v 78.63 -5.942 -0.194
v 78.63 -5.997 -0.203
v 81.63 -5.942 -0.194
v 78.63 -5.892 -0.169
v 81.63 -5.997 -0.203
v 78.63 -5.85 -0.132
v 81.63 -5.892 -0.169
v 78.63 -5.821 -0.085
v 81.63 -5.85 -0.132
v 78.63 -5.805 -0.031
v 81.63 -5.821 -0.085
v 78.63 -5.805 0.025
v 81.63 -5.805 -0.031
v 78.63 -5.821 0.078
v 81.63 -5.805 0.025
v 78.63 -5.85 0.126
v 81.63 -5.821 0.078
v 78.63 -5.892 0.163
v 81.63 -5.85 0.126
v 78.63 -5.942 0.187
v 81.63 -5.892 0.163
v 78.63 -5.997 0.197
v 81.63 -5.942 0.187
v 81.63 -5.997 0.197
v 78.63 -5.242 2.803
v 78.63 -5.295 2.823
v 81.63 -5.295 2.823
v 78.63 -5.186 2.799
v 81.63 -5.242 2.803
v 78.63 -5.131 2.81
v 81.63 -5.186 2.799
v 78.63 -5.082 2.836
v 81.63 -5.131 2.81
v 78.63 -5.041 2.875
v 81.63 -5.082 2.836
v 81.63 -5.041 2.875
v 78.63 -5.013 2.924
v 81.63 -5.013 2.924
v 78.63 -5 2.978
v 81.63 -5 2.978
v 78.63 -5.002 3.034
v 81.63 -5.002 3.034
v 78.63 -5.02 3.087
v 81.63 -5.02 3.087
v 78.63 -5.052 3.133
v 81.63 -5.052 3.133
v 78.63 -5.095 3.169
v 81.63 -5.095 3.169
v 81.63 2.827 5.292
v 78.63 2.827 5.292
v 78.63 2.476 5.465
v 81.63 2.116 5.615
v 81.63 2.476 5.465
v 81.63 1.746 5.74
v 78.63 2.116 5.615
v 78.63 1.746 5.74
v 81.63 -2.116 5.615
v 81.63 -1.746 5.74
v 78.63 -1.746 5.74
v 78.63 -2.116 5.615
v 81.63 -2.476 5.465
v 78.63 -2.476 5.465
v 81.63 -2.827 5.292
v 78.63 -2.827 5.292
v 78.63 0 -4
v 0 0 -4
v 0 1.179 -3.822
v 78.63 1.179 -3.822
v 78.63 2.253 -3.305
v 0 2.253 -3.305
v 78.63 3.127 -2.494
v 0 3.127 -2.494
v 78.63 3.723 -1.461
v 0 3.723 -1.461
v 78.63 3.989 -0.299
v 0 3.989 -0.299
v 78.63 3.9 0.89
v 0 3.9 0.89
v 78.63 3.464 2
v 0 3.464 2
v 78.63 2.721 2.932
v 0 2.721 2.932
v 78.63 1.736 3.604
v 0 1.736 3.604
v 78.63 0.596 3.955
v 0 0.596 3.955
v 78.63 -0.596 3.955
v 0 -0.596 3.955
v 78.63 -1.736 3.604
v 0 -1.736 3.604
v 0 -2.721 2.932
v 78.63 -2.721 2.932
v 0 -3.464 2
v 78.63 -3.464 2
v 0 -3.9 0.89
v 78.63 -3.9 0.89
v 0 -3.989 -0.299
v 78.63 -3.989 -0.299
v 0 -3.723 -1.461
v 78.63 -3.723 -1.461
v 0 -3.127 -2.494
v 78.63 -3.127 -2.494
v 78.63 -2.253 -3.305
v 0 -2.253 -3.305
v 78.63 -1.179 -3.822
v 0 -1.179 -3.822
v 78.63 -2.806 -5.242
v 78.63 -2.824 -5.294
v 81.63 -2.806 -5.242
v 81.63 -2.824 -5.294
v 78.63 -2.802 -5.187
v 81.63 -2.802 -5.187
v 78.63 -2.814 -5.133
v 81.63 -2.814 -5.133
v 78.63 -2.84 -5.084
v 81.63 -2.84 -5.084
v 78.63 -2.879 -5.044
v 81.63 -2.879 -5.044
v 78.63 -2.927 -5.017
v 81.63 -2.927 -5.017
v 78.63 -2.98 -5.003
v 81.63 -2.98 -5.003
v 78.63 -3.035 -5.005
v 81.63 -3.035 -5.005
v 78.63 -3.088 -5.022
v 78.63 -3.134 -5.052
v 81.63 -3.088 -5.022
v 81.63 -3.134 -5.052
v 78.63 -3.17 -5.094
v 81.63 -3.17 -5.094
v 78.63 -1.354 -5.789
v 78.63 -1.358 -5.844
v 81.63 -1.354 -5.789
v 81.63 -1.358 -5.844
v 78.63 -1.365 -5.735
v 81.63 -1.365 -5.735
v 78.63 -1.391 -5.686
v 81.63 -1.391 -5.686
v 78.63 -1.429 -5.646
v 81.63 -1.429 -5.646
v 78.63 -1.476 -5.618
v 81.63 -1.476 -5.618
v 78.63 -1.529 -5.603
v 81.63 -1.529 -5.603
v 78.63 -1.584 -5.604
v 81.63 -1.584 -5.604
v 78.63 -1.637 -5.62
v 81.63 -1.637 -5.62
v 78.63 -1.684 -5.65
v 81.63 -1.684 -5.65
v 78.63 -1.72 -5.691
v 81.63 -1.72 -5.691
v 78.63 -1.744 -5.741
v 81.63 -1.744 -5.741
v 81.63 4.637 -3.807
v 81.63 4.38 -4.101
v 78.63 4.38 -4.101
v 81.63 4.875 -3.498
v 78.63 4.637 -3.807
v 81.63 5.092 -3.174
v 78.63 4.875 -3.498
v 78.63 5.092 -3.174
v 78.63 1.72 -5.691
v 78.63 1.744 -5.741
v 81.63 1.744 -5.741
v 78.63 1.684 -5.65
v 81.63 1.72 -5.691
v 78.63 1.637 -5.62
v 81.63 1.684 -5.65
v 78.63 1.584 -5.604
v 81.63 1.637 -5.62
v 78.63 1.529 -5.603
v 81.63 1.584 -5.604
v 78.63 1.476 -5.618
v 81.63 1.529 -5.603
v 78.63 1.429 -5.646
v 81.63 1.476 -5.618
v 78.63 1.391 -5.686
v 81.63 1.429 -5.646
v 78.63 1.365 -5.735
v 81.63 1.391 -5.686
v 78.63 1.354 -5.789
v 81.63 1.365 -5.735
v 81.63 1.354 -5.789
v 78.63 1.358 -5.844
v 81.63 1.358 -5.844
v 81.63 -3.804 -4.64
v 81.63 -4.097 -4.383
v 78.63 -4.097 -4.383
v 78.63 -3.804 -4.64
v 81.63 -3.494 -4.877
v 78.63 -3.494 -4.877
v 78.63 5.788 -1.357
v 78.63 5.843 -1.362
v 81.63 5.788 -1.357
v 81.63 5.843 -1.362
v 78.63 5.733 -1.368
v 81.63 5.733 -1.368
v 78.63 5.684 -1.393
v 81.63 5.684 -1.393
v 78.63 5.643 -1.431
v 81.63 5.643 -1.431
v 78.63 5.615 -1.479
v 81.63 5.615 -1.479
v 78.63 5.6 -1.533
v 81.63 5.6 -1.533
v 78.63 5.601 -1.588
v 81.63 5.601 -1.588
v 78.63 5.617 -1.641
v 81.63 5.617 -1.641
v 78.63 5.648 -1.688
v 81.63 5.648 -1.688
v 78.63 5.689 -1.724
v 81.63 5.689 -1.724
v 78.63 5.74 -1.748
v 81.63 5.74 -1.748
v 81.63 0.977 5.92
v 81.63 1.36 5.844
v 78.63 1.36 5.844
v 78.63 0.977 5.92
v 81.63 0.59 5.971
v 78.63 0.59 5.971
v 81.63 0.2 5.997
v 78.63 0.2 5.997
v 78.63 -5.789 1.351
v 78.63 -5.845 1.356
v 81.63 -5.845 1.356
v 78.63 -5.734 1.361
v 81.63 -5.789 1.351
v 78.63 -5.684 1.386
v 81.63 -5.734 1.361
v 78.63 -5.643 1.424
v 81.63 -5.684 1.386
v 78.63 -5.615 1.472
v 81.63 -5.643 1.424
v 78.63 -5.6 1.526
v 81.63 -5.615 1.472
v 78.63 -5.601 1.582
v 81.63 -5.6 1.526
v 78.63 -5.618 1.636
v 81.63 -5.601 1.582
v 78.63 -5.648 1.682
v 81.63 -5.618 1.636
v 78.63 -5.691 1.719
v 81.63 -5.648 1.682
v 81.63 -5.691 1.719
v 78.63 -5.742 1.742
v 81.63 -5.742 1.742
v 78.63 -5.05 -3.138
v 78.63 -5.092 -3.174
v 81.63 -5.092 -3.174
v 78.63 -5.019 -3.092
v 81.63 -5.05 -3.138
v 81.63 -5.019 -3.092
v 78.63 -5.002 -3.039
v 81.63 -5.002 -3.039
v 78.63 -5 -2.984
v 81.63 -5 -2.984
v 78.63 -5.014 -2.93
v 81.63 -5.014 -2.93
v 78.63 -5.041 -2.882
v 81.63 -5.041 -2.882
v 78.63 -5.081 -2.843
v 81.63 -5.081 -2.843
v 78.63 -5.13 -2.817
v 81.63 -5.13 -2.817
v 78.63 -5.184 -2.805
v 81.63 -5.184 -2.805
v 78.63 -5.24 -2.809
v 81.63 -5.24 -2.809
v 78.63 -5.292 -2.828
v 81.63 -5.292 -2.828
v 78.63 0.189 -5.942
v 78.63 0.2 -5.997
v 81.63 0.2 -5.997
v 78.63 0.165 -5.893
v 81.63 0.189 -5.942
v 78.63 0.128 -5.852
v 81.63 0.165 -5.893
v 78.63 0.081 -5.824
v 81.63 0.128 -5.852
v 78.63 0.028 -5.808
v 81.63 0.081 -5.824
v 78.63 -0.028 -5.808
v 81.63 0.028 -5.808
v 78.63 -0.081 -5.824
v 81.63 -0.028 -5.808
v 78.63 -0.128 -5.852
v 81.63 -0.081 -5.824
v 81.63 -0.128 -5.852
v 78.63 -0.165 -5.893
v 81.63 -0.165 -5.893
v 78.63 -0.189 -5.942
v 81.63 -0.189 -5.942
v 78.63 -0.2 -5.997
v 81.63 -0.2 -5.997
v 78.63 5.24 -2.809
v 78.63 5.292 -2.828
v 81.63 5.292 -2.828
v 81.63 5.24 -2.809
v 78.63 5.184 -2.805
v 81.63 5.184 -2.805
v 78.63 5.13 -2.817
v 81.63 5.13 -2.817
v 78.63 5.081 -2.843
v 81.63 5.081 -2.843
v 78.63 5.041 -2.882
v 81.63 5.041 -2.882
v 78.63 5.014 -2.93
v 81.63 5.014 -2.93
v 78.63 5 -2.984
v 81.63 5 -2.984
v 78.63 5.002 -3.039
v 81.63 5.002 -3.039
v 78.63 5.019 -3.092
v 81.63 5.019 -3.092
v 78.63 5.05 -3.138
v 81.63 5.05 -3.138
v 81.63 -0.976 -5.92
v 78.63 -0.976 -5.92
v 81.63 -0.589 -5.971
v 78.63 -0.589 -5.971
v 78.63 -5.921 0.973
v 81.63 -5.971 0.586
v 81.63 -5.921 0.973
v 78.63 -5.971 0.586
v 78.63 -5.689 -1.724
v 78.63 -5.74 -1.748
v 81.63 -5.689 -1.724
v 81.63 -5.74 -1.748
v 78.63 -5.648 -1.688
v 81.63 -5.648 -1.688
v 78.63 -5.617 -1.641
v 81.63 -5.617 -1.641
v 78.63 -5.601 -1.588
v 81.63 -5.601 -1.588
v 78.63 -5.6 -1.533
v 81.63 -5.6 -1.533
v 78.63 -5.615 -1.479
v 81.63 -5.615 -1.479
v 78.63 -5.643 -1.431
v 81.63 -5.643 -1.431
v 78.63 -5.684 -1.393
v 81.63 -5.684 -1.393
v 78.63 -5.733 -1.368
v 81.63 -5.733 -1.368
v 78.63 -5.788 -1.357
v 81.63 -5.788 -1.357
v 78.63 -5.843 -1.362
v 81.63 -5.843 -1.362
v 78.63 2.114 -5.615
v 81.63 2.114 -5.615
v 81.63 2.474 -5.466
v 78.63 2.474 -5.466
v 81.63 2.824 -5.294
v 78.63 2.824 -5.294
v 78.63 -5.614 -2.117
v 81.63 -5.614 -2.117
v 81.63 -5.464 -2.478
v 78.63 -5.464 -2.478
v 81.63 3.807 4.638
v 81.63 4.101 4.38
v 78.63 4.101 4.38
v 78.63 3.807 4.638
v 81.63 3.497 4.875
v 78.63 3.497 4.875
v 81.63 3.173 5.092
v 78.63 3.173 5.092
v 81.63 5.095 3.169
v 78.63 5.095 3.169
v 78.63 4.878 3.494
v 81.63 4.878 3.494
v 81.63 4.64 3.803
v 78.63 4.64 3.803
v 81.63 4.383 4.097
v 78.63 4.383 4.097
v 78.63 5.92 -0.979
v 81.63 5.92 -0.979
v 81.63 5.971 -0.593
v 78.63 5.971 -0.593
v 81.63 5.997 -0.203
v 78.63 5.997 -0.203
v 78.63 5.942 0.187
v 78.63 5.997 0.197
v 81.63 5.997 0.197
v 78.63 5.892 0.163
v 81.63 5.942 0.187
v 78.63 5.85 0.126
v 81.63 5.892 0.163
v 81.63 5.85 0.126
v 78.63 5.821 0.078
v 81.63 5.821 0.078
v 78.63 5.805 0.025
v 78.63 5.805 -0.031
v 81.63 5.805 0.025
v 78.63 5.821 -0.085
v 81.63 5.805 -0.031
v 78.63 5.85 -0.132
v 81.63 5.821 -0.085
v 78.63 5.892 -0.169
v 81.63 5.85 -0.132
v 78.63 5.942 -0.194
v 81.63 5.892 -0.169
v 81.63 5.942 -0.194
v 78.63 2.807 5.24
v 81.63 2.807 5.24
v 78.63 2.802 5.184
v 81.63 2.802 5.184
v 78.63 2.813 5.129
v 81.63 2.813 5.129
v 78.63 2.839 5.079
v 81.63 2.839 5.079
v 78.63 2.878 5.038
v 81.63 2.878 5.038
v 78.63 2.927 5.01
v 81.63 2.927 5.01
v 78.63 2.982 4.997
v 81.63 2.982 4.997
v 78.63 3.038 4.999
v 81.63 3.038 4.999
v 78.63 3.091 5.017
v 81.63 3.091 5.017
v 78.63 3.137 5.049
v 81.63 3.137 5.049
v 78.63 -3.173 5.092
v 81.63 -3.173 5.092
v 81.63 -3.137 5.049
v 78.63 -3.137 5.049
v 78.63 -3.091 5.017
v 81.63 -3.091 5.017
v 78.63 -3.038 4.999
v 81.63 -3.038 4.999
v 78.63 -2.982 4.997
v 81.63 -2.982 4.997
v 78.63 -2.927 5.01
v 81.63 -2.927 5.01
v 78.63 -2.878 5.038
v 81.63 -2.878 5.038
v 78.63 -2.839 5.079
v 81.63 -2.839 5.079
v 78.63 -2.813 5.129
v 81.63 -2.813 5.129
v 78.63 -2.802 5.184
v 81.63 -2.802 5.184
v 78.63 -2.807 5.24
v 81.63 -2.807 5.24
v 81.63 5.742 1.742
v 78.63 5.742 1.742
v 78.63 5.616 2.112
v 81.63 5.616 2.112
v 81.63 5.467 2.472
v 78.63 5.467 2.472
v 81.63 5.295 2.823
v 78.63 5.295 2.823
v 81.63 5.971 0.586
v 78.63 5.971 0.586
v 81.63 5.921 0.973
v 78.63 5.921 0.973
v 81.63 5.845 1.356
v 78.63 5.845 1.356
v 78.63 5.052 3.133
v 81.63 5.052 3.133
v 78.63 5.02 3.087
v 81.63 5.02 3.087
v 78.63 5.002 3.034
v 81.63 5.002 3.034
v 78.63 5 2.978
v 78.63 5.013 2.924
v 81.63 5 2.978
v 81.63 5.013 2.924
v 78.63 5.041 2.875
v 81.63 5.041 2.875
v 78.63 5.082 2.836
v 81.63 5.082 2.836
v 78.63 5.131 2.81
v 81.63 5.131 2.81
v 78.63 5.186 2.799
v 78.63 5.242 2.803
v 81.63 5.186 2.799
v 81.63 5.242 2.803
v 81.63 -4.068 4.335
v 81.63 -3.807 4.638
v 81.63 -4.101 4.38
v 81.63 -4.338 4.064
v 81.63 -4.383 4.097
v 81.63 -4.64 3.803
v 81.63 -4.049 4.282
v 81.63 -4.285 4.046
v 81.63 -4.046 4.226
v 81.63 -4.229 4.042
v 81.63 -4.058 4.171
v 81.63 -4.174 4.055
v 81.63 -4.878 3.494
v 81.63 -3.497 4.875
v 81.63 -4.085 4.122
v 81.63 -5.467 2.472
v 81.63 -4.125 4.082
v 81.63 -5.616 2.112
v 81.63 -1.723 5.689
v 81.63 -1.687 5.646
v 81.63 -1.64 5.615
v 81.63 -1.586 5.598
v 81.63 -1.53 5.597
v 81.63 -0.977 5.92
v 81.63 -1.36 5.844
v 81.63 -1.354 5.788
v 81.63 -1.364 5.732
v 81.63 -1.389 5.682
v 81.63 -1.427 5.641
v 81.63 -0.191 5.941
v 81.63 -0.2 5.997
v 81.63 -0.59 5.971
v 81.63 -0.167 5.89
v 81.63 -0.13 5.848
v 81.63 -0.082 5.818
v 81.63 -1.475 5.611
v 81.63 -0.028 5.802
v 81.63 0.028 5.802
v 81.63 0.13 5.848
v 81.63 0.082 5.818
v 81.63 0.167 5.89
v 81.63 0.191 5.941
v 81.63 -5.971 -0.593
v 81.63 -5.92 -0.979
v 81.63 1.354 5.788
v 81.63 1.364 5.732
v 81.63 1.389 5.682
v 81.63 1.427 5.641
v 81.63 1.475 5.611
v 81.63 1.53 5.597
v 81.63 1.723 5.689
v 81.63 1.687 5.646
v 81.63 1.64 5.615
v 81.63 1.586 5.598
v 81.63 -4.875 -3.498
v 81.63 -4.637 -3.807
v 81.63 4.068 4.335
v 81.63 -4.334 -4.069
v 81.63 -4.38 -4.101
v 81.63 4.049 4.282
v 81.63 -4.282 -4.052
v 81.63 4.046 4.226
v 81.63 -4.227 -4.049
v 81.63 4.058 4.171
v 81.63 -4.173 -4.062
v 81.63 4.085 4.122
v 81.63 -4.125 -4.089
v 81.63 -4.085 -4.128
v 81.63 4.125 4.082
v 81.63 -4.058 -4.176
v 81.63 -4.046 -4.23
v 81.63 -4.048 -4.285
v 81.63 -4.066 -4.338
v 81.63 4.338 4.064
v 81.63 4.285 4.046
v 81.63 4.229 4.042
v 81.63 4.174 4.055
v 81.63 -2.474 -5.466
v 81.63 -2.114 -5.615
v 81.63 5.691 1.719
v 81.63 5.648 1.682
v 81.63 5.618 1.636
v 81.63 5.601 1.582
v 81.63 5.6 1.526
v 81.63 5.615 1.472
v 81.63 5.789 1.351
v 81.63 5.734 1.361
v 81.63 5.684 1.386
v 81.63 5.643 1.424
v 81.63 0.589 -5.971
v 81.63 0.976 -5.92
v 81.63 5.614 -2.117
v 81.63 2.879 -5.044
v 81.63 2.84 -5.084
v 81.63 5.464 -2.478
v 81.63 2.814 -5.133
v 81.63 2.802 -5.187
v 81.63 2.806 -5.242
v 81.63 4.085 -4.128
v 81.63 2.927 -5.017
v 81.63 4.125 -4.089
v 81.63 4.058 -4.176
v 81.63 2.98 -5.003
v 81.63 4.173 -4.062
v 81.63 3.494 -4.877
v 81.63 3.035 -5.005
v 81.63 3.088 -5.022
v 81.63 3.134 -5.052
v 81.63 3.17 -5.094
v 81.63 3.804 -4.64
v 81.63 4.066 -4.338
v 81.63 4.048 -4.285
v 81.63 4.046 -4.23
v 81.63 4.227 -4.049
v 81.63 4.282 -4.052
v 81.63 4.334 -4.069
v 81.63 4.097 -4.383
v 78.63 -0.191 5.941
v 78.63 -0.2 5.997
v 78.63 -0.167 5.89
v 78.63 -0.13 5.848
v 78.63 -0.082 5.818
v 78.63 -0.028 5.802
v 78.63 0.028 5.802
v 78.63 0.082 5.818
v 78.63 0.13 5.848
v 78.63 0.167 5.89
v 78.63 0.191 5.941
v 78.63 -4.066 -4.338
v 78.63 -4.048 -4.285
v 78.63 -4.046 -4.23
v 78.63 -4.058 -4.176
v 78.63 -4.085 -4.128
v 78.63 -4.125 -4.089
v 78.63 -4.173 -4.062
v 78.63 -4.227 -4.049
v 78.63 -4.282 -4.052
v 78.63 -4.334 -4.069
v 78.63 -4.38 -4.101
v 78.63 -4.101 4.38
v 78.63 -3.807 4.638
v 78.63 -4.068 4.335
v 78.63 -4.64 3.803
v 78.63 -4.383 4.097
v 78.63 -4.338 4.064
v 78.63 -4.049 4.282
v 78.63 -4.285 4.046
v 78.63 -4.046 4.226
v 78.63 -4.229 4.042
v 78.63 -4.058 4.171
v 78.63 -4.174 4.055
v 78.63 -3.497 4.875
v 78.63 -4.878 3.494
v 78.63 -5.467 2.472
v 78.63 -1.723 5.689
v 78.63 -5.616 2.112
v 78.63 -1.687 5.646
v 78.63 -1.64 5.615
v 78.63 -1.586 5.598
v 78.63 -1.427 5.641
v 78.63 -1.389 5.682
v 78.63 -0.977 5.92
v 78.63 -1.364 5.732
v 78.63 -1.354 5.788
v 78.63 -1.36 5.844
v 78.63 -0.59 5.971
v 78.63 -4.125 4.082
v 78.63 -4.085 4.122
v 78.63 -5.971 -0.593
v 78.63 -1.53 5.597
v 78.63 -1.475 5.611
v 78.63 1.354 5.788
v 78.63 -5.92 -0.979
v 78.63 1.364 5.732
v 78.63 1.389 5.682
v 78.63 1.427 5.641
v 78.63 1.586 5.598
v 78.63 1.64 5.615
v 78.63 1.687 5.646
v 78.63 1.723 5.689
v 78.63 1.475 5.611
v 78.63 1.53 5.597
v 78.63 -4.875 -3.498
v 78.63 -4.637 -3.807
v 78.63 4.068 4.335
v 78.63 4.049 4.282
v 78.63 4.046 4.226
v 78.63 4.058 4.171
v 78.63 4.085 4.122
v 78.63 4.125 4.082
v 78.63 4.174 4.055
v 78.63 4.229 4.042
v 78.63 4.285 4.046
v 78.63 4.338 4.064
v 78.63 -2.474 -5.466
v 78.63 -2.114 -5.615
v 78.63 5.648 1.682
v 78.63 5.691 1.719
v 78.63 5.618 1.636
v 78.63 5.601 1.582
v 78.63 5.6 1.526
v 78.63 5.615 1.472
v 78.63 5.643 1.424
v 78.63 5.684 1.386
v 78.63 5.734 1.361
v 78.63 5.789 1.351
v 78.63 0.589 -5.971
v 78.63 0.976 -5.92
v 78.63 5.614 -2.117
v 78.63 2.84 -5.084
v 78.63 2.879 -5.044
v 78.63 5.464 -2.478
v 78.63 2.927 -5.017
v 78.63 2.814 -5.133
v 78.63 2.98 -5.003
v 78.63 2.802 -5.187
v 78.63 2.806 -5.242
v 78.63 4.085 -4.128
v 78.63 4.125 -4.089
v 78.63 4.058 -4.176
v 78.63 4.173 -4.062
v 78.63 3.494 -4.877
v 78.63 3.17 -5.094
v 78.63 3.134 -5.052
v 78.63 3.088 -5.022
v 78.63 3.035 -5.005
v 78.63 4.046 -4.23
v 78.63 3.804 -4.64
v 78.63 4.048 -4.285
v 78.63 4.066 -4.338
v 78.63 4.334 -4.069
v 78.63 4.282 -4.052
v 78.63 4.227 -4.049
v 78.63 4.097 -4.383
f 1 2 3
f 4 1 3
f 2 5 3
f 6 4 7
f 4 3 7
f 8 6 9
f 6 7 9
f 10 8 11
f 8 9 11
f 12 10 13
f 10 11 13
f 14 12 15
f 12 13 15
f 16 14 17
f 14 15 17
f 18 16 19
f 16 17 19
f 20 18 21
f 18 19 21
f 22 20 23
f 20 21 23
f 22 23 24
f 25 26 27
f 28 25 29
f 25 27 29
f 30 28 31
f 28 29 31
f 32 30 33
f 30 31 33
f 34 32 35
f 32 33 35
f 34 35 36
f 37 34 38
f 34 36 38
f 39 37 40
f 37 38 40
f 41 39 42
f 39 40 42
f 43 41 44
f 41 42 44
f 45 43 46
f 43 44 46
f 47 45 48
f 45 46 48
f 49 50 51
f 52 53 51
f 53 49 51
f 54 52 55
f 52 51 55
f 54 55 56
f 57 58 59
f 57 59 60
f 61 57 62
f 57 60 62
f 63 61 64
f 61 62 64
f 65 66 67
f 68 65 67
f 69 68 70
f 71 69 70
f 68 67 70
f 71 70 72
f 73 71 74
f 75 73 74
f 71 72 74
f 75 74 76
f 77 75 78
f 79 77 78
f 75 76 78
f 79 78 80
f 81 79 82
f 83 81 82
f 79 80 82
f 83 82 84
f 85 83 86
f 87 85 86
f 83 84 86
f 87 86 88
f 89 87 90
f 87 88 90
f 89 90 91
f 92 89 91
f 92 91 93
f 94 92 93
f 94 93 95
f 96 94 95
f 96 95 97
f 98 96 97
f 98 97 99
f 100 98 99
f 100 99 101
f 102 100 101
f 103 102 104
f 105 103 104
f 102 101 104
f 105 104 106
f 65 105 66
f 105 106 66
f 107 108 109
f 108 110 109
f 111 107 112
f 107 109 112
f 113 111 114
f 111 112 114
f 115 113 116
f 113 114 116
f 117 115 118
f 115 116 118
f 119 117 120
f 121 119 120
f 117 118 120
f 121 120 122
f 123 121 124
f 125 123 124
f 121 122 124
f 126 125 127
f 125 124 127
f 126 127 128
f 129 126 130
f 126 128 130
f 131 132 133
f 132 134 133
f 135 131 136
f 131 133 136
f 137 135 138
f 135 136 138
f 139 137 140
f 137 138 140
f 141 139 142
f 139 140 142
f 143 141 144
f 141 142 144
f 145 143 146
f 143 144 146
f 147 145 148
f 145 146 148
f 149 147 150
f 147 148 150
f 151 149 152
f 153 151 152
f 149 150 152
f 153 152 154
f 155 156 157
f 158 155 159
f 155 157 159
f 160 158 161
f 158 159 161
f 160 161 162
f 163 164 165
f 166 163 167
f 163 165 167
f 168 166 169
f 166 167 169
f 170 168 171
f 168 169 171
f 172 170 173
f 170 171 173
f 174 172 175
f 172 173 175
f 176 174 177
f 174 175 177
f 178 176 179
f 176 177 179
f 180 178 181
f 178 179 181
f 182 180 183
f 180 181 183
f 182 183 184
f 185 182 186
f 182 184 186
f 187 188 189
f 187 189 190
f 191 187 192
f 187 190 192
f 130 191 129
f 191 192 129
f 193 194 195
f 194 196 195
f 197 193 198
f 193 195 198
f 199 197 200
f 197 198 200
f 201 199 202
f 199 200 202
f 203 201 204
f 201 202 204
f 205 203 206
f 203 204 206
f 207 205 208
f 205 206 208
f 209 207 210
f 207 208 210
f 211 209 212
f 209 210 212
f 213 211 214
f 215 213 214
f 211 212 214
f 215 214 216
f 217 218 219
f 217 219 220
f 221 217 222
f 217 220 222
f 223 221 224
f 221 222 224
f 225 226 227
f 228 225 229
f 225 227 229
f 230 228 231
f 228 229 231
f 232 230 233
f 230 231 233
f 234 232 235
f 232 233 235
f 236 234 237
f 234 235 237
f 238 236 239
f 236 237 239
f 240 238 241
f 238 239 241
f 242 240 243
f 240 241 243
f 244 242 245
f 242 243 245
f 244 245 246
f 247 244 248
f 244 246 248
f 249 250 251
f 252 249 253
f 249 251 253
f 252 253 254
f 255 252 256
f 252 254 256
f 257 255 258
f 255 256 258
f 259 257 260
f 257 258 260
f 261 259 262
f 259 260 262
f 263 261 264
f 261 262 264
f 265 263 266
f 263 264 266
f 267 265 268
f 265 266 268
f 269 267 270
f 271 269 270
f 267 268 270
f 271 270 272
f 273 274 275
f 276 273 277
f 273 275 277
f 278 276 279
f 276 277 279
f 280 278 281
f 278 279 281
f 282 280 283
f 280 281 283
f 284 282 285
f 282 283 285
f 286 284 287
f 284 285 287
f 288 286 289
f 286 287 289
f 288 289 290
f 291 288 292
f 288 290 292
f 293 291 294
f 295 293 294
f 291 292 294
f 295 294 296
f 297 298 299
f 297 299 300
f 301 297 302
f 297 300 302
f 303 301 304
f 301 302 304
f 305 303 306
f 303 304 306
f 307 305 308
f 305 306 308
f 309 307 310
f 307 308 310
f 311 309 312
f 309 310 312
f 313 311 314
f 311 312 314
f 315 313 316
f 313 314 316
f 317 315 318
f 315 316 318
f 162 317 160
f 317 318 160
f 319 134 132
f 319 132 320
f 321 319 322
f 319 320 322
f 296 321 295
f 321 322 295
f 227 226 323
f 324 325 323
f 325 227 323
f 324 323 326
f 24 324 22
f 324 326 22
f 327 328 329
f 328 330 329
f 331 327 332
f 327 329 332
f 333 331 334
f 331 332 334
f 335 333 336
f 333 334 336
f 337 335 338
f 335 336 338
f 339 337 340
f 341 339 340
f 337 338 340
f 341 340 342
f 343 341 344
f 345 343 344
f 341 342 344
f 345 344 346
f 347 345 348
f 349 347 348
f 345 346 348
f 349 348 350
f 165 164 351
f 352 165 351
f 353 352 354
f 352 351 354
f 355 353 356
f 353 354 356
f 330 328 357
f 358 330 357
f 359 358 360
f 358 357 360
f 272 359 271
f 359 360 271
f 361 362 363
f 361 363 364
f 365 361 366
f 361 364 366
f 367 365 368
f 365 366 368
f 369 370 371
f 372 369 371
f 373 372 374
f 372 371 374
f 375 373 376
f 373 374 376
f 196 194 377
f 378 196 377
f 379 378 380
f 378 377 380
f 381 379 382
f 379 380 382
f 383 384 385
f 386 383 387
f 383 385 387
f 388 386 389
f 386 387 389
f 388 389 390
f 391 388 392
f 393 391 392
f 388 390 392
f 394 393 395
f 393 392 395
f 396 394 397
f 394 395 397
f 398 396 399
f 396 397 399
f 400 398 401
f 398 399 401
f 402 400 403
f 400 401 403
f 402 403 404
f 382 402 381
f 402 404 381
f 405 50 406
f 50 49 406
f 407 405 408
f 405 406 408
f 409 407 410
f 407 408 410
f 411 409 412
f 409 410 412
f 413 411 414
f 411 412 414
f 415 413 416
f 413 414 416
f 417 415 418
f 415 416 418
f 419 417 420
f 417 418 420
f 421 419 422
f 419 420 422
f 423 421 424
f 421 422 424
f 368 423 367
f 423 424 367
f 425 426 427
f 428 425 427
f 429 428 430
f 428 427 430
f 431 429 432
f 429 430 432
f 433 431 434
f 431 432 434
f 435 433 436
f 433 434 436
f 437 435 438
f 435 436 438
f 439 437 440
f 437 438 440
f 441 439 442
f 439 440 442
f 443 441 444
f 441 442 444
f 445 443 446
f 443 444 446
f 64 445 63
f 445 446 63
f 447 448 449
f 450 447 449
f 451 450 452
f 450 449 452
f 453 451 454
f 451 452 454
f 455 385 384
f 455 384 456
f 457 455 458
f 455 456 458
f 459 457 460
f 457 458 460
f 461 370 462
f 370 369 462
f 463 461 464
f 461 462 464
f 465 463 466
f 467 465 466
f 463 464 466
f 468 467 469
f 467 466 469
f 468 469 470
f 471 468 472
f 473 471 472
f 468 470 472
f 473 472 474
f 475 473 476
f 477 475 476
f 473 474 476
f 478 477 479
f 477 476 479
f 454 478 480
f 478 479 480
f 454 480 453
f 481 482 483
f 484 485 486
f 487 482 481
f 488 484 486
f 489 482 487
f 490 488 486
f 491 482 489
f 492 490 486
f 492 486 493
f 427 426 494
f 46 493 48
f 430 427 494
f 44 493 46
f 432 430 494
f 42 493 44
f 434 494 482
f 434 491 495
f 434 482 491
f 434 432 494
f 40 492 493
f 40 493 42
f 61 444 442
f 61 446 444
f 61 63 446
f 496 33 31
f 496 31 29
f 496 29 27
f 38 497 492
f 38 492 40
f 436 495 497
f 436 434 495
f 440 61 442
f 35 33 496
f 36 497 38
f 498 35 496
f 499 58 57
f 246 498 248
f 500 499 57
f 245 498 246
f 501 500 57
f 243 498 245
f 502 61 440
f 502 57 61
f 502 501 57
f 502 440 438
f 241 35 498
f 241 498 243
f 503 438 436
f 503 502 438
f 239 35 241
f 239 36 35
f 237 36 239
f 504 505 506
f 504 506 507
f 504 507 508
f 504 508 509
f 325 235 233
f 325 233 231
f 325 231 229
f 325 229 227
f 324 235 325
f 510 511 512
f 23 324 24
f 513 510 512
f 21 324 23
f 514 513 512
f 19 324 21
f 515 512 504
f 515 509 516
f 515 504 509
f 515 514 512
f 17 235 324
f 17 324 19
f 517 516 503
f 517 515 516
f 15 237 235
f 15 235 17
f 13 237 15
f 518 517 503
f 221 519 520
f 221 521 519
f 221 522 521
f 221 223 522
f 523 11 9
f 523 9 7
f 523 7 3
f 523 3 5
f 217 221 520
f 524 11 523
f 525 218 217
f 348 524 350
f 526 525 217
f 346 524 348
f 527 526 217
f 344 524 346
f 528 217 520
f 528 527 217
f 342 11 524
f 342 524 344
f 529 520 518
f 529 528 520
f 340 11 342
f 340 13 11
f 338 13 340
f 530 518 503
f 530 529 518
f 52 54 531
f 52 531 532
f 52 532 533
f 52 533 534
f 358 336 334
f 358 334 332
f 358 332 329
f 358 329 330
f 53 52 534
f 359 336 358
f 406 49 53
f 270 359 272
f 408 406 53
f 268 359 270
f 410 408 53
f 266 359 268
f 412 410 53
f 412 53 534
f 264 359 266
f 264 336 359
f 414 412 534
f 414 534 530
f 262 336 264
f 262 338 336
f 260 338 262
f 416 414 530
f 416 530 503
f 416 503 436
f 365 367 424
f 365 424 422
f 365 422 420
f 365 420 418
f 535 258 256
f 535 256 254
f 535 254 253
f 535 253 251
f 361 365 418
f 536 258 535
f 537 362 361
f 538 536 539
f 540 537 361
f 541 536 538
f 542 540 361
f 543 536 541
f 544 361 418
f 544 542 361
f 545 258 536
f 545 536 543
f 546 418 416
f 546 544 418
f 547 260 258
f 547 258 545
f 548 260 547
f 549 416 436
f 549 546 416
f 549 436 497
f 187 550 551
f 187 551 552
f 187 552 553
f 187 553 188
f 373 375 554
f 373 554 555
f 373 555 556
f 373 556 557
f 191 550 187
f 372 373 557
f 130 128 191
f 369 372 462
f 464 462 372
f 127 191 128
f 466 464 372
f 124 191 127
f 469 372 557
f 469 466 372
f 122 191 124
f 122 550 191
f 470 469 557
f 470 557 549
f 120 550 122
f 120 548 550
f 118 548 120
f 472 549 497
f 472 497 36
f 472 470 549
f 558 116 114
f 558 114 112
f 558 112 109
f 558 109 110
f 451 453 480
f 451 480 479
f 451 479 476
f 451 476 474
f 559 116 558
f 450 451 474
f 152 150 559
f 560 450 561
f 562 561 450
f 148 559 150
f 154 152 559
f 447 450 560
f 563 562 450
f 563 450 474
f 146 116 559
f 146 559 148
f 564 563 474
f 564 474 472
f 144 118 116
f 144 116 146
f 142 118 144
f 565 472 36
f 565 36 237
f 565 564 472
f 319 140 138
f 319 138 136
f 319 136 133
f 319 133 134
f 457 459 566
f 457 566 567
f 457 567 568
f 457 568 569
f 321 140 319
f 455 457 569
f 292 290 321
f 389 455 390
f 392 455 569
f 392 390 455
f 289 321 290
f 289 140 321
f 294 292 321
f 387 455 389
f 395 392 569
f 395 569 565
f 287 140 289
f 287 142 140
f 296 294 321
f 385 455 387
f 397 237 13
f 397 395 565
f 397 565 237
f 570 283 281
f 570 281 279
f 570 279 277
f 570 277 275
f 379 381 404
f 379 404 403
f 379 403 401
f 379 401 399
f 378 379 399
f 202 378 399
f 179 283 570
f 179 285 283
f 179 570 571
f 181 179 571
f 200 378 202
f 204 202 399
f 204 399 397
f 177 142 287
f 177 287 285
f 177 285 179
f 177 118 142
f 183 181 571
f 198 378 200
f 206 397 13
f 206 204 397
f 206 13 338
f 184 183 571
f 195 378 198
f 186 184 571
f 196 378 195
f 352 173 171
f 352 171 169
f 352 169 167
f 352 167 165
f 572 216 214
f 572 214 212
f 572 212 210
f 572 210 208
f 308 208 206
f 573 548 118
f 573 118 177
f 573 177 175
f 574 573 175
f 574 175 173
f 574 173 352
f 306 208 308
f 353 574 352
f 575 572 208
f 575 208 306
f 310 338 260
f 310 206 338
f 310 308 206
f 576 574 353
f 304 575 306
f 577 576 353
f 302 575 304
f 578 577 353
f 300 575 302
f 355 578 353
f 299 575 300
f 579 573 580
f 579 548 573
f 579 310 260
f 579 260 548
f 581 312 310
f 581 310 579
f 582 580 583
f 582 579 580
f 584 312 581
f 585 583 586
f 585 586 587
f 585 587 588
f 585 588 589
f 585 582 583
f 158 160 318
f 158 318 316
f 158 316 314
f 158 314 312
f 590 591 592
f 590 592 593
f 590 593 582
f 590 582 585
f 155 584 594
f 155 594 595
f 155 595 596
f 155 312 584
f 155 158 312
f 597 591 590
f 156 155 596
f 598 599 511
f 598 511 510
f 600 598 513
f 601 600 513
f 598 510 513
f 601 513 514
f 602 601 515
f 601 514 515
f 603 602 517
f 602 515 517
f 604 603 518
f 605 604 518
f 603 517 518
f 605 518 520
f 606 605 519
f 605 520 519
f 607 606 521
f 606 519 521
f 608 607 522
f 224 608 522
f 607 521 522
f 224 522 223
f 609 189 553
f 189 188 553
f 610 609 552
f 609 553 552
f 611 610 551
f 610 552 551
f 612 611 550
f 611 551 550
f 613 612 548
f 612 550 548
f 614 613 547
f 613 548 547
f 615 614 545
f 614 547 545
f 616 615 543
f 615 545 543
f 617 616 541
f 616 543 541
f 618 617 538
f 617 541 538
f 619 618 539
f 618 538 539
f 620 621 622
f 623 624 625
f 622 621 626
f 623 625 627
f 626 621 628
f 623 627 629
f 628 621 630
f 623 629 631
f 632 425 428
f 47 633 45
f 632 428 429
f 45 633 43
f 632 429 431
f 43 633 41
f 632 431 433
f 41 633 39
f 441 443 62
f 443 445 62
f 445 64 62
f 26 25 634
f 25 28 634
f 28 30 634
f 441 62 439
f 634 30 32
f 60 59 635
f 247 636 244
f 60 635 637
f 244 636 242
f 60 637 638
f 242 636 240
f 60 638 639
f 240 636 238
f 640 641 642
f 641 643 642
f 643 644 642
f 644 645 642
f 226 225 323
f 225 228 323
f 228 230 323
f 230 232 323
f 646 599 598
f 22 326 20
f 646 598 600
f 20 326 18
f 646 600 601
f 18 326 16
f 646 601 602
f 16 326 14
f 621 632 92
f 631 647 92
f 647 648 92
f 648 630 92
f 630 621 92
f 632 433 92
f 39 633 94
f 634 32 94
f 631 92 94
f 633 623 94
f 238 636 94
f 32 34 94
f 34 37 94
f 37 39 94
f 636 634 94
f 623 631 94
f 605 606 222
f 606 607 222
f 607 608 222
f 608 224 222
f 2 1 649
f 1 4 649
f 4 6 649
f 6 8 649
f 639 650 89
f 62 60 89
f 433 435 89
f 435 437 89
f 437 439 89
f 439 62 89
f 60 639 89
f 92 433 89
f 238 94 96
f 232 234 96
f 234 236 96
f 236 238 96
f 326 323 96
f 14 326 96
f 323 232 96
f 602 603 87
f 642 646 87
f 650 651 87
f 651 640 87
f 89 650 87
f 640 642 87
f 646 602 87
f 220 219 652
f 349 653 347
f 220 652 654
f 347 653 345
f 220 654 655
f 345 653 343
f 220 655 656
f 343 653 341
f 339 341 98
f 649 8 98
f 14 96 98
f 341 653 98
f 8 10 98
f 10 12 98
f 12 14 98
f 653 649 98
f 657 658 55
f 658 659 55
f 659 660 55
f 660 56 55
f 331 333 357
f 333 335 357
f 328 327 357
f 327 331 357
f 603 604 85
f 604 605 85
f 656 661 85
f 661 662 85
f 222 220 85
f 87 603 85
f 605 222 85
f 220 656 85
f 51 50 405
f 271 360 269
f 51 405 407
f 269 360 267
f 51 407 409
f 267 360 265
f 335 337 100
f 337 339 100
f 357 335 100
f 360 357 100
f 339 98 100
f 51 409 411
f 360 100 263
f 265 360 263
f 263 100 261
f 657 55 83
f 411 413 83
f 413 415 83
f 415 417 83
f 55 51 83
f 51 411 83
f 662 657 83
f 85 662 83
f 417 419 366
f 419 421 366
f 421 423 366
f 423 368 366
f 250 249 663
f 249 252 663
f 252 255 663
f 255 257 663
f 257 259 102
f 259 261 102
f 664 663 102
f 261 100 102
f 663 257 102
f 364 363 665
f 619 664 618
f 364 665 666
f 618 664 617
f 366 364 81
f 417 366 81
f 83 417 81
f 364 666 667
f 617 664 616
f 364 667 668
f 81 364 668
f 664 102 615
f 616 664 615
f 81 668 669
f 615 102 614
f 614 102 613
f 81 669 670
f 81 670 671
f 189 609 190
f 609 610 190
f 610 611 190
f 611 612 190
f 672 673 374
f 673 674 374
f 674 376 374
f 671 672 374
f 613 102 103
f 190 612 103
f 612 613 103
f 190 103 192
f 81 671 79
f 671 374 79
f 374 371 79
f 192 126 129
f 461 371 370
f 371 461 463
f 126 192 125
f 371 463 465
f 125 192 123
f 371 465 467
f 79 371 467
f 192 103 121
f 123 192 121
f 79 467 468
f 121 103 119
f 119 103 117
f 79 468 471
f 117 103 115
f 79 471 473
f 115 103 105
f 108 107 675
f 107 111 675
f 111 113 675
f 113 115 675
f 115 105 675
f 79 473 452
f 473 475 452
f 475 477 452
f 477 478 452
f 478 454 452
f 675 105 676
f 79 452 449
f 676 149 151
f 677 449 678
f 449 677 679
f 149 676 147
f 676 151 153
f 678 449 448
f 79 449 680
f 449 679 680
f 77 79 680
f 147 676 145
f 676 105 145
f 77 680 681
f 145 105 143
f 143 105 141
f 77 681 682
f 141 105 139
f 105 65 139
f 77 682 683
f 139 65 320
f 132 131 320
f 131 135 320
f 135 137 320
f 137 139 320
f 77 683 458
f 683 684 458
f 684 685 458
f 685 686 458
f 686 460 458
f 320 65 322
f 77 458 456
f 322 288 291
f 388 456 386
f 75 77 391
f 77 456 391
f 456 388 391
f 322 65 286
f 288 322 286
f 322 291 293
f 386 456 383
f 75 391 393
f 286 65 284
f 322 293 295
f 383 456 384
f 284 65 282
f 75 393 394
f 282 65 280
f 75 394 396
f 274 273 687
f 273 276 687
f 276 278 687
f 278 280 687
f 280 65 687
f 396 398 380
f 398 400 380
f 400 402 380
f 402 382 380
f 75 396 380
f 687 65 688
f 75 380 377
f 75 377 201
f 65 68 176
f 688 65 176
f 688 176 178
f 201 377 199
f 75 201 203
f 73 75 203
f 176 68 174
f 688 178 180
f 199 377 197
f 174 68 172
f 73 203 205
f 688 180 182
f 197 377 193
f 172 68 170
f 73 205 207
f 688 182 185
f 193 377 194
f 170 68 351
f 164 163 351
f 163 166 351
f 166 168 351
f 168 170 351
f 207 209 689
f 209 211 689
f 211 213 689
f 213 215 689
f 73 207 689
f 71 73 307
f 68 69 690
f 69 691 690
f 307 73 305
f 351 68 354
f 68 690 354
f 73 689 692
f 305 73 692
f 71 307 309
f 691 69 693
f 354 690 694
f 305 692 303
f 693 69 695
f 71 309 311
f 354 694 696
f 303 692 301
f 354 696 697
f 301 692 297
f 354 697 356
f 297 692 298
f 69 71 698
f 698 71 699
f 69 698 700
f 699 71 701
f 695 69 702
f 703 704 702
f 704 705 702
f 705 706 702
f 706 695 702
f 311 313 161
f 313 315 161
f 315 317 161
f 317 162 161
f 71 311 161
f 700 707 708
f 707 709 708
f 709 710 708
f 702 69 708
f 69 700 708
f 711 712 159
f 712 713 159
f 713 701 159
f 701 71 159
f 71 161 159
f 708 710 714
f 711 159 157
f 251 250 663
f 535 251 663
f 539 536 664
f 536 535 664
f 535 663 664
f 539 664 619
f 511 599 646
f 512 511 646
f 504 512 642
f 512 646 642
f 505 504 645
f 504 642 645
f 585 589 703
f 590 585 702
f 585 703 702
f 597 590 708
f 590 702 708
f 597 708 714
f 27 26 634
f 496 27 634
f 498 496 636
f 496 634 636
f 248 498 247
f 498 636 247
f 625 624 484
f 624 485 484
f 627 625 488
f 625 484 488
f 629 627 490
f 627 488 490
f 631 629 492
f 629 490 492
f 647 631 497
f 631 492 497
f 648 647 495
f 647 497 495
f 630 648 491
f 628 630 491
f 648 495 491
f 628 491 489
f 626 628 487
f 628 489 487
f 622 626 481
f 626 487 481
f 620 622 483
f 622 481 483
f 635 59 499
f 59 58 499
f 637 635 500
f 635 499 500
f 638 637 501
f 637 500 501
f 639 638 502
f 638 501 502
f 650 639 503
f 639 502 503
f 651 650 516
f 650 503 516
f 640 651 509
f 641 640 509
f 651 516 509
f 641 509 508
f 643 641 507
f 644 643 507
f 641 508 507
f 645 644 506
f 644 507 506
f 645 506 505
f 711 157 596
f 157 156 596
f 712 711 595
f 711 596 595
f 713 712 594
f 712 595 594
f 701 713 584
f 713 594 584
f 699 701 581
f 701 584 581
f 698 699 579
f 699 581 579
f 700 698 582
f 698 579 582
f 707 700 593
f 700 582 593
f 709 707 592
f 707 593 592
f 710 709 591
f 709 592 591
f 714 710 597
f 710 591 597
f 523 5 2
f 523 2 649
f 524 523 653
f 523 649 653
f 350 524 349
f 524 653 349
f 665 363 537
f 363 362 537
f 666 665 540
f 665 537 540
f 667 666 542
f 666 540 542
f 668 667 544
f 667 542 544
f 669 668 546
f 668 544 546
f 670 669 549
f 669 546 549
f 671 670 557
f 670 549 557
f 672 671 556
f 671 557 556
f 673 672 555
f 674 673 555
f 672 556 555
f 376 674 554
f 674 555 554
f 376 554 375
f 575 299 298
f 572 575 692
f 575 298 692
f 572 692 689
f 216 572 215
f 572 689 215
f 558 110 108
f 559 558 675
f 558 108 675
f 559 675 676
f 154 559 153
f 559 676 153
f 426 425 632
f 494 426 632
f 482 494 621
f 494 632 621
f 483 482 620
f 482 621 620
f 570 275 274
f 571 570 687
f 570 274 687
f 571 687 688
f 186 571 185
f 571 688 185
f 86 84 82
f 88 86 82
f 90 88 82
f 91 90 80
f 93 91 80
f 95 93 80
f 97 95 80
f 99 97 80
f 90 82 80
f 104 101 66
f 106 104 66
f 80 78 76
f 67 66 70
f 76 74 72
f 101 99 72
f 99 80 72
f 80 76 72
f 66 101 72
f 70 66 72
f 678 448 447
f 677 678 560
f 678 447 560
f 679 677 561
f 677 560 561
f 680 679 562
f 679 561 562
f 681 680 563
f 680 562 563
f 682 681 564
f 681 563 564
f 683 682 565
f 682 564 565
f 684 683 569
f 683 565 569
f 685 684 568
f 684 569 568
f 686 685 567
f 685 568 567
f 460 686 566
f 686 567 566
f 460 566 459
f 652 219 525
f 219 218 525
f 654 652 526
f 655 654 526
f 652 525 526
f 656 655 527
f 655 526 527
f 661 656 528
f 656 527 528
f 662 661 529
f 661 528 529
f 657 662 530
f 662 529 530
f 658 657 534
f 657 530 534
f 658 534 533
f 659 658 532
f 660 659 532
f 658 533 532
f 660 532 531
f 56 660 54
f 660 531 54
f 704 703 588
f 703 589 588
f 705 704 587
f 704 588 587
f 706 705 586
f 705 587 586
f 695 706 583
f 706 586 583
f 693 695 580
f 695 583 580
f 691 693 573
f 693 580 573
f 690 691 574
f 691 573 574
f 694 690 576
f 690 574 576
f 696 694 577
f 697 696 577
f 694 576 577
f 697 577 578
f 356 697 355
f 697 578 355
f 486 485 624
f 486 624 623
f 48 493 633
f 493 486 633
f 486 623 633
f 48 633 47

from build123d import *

# Parameters (mm, degrees)
SKETCH1_R           = 4
BOSS_EXTRUDE2_DEPTH = 78.63
SKETCH2_R           = 6
BOSS_EXTRUDE3_DEPTH = 3
SKETCH3_R           = 0.2
CUT_EXTRUDE1_DEPTH  = 3
CIRPATTERN1_COUNT   = 24


with BuildPart() as part:
    # Sketch1 → Boss-Extrude2 (new body)
    with BuildSketch(Plane(origin=(0, 0, 0), x_dir=(0, 0, -1), z_dir=(1, 0, 0))):
        Circle(SKETCH1_R)
    extrude(amount=BOSS_EXTRUDE2_DEPTH)

    # Sketch2 → Boss-Extrude3 (add)
    with BuildSketch(Plane(origin=(78.63, 0, 0), x_dir=(0, 0, -1), z_dir=(1, 0, 0))):
        Circle(SKETCH2_R)
    extrude(amount=BOSS_EXTRUDE3_DEPTH)

    # Sketch3 → Cut-Extrude1 (cut)
    with BuildSketch(Plane(origin=(81.63, 0, 0), x_dir=(0, 0, -1), z_dir=(1, 0, 0))):
        with Locations((-6, 0)):
            Circle(SKETCH3_R)
    cut_extrude1 = extrude(amount=-CUT_EXTRUDE1_DEPTH, mode=Mode.SUBTRACT)

    # CirPattern1: Cut-Extrude1 ×24 about axis
    cirpattern1_axis = Axis((0, 0, -0.003264402), (1, 0, 0))
    for i in range(1, CIRPATTERN1_COUNT):
        add(cut_extrude1.rotate(cirpattern1_axis, i * 360 / CIRPATTERN1_COUNT), mode=Mode.SUBTRACT)


solid = part.part
